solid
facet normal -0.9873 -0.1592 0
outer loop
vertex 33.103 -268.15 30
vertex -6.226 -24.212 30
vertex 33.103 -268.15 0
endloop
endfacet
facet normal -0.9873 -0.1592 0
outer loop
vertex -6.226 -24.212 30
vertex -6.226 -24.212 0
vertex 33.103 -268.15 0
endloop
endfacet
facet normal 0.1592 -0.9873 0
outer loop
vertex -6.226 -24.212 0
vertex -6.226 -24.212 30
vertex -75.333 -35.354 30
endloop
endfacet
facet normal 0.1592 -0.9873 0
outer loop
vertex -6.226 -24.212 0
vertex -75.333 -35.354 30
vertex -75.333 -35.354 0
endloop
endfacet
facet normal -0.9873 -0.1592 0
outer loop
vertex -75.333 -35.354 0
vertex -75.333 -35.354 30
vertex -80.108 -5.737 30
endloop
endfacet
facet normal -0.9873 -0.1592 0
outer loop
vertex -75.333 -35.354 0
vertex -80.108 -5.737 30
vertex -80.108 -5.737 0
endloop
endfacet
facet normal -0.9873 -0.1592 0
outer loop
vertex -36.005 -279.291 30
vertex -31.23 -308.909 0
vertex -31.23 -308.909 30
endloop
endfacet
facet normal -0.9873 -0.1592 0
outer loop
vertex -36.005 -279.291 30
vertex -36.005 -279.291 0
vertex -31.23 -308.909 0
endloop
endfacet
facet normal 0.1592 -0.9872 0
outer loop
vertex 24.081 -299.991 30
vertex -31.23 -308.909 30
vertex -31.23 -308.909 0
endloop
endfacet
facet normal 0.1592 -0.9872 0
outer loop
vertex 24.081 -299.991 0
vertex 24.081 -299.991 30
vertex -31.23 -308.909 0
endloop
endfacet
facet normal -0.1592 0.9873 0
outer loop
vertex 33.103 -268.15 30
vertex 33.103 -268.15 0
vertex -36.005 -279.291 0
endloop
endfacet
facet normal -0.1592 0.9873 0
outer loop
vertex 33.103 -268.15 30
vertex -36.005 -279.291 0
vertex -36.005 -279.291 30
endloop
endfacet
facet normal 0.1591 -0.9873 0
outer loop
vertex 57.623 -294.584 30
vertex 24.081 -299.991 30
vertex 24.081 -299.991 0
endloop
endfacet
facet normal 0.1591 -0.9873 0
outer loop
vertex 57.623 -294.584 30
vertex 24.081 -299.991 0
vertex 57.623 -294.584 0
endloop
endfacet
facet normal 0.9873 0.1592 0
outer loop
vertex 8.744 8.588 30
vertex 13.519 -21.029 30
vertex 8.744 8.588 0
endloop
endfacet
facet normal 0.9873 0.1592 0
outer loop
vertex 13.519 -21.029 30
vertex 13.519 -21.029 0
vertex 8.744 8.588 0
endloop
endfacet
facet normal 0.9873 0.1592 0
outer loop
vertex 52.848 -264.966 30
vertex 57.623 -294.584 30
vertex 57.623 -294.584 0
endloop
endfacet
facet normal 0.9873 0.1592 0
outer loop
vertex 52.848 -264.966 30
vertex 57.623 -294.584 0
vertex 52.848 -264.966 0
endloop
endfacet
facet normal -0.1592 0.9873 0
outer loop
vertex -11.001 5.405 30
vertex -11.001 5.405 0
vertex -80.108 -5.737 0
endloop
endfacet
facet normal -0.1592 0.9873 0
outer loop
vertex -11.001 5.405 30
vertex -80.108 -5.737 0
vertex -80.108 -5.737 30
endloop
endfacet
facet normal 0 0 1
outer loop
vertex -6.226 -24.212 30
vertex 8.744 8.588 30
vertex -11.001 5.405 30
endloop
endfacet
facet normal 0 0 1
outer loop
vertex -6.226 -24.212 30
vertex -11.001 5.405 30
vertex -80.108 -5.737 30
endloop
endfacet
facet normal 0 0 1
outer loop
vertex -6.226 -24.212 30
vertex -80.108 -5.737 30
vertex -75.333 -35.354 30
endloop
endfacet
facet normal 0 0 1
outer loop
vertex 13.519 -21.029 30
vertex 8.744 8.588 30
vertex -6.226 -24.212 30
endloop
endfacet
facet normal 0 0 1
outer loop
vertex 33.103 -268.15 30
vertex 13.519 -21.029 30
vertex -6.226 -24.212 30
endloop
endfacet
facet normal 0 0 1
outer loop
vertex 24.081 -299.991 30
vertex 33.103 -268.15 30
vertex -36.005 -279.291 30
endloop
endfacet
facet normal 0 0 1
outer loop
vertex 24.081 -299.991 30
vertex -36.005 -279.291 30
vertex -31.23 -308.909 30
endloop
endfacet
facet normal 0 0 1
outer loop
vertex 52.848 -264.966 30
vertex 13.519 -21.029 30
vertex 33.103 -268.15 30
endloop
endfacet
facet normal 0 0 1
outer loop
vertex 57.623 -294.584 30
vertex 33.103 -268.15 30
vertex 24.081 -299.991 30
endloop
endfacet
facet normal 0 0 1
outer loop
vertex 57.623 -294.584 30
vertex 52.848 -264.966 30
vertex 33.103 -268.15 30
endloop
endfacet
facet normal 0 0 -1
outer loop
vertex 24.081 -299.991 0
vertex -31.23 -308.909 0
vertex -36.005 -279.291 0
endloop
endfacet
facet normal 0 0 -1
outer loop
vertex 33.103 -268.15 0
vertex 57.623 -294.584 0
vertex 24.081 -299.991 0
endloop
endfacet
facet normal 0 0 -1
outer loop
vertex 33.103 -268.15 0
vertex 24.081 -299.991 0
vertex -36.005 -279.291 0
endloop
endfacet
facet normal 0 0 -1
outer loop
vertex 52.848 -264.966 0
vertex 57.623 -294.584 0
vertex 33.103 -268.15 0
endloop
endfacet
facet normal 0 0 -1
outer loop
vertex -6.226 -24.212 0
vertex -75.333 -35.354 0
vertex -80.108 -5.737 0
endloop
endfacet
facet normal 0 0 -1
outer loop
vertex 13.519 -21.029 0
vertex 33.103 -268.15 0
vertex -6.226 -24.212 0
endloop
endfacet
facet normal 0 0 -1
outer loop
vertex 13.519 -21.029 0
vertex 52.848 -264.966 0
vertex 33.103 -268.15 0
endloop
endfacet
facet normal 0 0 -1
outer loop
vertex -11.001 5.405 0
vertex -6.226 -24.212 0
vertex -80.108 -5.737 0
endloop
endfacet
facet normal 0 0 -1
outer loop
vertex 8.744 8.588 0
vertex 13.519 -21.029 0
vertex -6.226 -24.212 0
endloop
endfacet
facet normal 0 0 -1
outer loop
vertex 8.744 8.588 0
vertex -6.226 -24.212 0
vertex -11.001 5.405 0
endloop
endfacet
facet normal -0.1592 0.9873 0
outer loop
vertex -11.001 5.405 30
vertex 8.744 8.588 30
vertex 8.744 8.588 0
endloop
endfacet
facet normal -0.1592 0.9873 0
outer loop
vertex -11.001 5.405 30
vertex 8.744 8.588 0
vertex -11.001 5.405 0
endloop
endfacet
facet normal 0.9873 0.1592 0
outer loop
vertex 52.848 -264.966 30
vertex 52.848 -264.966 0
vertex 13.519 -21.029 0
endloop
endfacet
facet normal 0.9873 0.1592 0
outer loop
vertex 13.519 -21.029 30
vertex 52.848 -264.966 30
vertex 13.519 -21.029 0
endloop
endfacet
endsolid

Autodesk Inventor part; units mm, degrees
ref_plane "YZ Plane" through (0, 0, 0) normal (1, 0, 0) x (0, 1, 0)
ref_plane "XZ Plane" through (0, 0, 0) normal (0, 1, 0) x (-1, 0, 0)
ref_plane "XY Plane" through (0, 0, 0) normal (0, 0, 1) x (1, 0, 0)
sketch "Sketch1" plane through (0, 0, 0) normal (0, 0, 1) x (1, 0, 0)
  arc A0 (5.5018, -3.1706) -> (4.1426, 4.8126) centre (0, 0) ccw projected
  line L0 (-0.2789, 17.1872) -> (4.1426, 4.8126) projected
  arc A1 (-0.2789, 17.1872) -> (-5.4243, 16.3111) centre (-2.7743, 16.2955) ccw projected
  line L1 (-5.5018, 3.1706) -> (-5.4243, 16.3111) projected
  arc A2 (-5.5018, 3.1706) -> (-4.1426, -4.8126) centre (0, 0) ccw projected
  line L2 (-4.1426, -4.8126) -> (0.2789, -17.1872) projected
  arc A3 (0.2789, -17.1872) -> (5.4243, -16.3111) centre (2.7743, -16.2955) ccw projected
  line L3 (5.4243, -16.3111) -> (5.5018, -3.1706) projected
  circle A4 centre (1.7673, -10.3806) radius 0.5 projected
  circle A5 centre (1.2638, -7.4232) radius 0.5 projected
  circle A6 centre (0, 0) radius 4.375 projected
  circle A7 centre (-2.2708, 13.3381) radius 0.5 projected
  circle A8 centre (-1.7673, 10.3806) radius 0.5 projected
  circle A9 centre (-1.2638, 7.4232) radius 0.5 projected
  circle A10 centre (-2.7743, 16.2955) radius 0.5 projected
  circle A11 centre (2.2708, -13.3381) radius 0.5 projected
  circle A12 centre (2.7743, -16.2955) radius 0.5 projected
  line L4 (0, 0) -> (2.7743, -16.2955)
  line L5 (0, 0) -> (47.7501, -296.1755)
  line L6 (0, 0) -> (23.8751, -148.0877)
  line L7 (-9.8725, -1.5917) -> (37.8776, -297.7672)
  line L8 (37.8776, -297.7672) -> (57.6226, -294.5838)
  line L9 (57.6226, -294.5838) -> (9.8725, 1.5917)
  line L10 (9.8725, 1.5917) -> (-9.8725, -1.5917)
  line L11 (-9.8725, -1.5917) -> (57.6226, -294.5838) construction
  line L12 (37.8776, -297.7672) -> (9.8725, 1.5917) construction
  circle A13 centre (0, 0) radius 25
  point P0 (13.5195, -21.0291)
  point P1 (-6.2255, -24.2124)
  dimension "d0" = 300
  dimension "d1" = 150
  dimension "d2" = 20
  dimension "d3" = 50
extrude "Extrusion1" add sketch "Sketch1" along normal blind 30 contours L3 A3 L5 A12 L4 A11 A4 A5 A6 L10 A0 | A0 L10 L9 A13 L5 A3 L3 | L10 A6 A2 L1 A1 L0 A0 | A0 L0 A1 L1 A2 L10 L7 A13 L9 | L10 A6 | A6 L4 L10 | L5 A13 L7 L10 A2 L2 A3 | A3 L2 A2 L10 A6 L5 A5 A4 A11 A12 | L9 L8 L5 A13 | L10 L5 A6 | L4 A6 L5 | L5 A12 | A12 L5 | L5 L8 L7 A13 | L4 A5 L5 A6 | L5 A11 L4 A12 | L4 A5 L5 | A5 L4 | L5 A5 | L5 A11 L4 | A11 L5 | L4 A4 L5 A5 | L4 A11 | L5 A4 L4 A11 | L4 A4 L5 | A4 L4 | L5 A4 | A7 | A8 | A9 | A10
sketch "Sketch2" plane through (37.8776, -297.7672, 0) normal (-0.9872517, -0.159167, 0) x (0, 0, 1)
  line L0 (30, 277.0871) -> (30, 0) projected
  line L1 (30, 0) -> (0, 0)
  line L2 (0, 0) -> (0, 30)
  line L3 (0, 30) -> (30, 30)
  line L4 (30, 30) -> (30, 0)
  point P0 (0, 300)
  point P1 (30, 30)
  dimension "d6" = 30
  dimension "d7" = 30
extrude "Extrusion2" add sketch "Sketch2" along normal blind 70
sketch "Sketch4" plane through (0, 0, 30) normal (0, 0, 1) x (1, 0, 0)
  line L0 (-6.2255, -24.2124) -> (33.1026, -268.1496) projected
  line L1 (33.1026, -268.1496) -> (-36.005, -279.2913) projected
  line L2 (-31.23, -308.9089) -> (-36.005, -279.2913) projected
  line L3 (57.6226, -294.5838) -> (-31.23, -308.9089) projected
  line L4 (57.6226, -294.5838) -> (13.5195, -21.0291) projected
  arc A0 (13.5195, -21.0291) -> (-6.2255, -24.2124) centre (0, 0) ccw projected
  arc A1 (13.5195, -21.0291) -> (-6.2255, -24.2124) centre (0, 0) ccw projected
  circle A2 centre (0, 0) radius 25
  point P0 (13.5195, -21.0291)
extrude "Extrusion4" cut sketch "Sketch4" against normal through all contours A0 A2
sketch "Sketch5" plane through (0, 0, 30) normal (0, 0, 1) x (1, 0, 0)
  arc A0 (-6.2255, -24.2124) -> (13.5195, -21.0291) centre (0, 0) ccw projected
  line L0 (-6.2255, -24.2124) -> (33.1026, -268.1496) projected
  line L1 (33.1026, -268.1496) -> (-36.005, -279.2913) projected
  line L2 (-31.23, -308.9089) -> (-36.005, -279.2913) projected
  line L3 (57.6226, -294.5838) -> (-31.23, -308.9089) projected
  line L4 (57.6226, -294.5838) -> (13.5195, -21.0291) projected
  line L5 (-6.2255, -24.2124) -> (33.1026, -268.1496) projected
  line L6 (-6.2255, -24.2124) -> (13.5195, -21.0291)
extrude "Extrusion5" add sketch "Sketch5" against normal up to surface (30 mm away) contours L6 A0
ref_plane "Work Plane2" through (33.1836, -142.9977, 0) normal (0.159167, -0.9872517, 0) x (0.9872517, 0.159167, 0)
ref_plane "Work Plane1" through (52.8476, -264.9663, 0) normal (0.159167, -0.9872517, 0) x (0.9872517, 0.159167, 0)
mirror "Mirror1" about plane through (33.1836, -142.9977, 0) normal (0.159167, -0.9872517, 0) of "Extrusion2"
mirror "Mirror2" about plane through (33.1836, -142.9977, 0) normal (0.159167, -0.9872517, 0) of "Extrusion1"
sketch "Sketch6" plane through (0, 0, 30) normal (0, 0, 1) x (1, 0, 0)
  line L0 (33.1026, -268.1496) -> (-36.005, -279.2913) projected
  line L1 (-31.23, -308.9089) -> (-36.005, -279.2913) projected
  line L2 (24.0813, -299.9914) -> (-31.23, -308.9089) projected
  arc A0 (24.0813, -299.9914) -> (52.8476, -264.9663) centre (46.6221, -289.1787) ccw projected
  line L3 (52.8476, -264.9663) -> (8.7445, 8.5884) projected
  line L4 (-80.1082, -5.7366) -> (8.7445, 8.5884) projected
  line L5 (-80.1082, -5.7366) -> (-75.3332, -35.3541) projected
  line L6 (-6.2255, -24.2124) -> (-75.3332, -35.3541) projected
  line L7 (-6.2255, -24.2124) -> (33.1026, -268.1496) projected
  line L8 (-36.005, -279.2913) -> (-31.23, -308.9089) projected
  line L9 (-36.005, -279.2913) -> (52.8476, -264.9663)
  line L10 (24.0813, -299.9914) -> (-31.23, -308.9089) projected
  line L11 (-31.23, -308.9089) -> (57.6226, -294.5838)
  line L12 (57.6226, -294.5838) -> (52.8476, -264.9663)
  point P0 (0, 0)
extrude "Extrusion6" cut sketch "Sketch6" against normal through all contours A0 L11 L12
sketch "Sketch7" plane through (0, 0, 30) normal (0, 0, 1) x (1, 0, 0)
  point P0 (0, 0)
sketch "Sketch8" plane through (0, 0, 30) normal (0, 0, 1) x (1, 0, 0)
  line L0 (-31.23, -308.9089) -> (-36.005, -279.2913) projected
  line L1 (-6.2255, -24.2124) -> (33.1026, -268.1496) projected
  line L2 (-36.005, -279.2913) -> (33.1026, -268.1496)
  point P0 (0, 0)
properties part number "arm" material "PET Plastic"
